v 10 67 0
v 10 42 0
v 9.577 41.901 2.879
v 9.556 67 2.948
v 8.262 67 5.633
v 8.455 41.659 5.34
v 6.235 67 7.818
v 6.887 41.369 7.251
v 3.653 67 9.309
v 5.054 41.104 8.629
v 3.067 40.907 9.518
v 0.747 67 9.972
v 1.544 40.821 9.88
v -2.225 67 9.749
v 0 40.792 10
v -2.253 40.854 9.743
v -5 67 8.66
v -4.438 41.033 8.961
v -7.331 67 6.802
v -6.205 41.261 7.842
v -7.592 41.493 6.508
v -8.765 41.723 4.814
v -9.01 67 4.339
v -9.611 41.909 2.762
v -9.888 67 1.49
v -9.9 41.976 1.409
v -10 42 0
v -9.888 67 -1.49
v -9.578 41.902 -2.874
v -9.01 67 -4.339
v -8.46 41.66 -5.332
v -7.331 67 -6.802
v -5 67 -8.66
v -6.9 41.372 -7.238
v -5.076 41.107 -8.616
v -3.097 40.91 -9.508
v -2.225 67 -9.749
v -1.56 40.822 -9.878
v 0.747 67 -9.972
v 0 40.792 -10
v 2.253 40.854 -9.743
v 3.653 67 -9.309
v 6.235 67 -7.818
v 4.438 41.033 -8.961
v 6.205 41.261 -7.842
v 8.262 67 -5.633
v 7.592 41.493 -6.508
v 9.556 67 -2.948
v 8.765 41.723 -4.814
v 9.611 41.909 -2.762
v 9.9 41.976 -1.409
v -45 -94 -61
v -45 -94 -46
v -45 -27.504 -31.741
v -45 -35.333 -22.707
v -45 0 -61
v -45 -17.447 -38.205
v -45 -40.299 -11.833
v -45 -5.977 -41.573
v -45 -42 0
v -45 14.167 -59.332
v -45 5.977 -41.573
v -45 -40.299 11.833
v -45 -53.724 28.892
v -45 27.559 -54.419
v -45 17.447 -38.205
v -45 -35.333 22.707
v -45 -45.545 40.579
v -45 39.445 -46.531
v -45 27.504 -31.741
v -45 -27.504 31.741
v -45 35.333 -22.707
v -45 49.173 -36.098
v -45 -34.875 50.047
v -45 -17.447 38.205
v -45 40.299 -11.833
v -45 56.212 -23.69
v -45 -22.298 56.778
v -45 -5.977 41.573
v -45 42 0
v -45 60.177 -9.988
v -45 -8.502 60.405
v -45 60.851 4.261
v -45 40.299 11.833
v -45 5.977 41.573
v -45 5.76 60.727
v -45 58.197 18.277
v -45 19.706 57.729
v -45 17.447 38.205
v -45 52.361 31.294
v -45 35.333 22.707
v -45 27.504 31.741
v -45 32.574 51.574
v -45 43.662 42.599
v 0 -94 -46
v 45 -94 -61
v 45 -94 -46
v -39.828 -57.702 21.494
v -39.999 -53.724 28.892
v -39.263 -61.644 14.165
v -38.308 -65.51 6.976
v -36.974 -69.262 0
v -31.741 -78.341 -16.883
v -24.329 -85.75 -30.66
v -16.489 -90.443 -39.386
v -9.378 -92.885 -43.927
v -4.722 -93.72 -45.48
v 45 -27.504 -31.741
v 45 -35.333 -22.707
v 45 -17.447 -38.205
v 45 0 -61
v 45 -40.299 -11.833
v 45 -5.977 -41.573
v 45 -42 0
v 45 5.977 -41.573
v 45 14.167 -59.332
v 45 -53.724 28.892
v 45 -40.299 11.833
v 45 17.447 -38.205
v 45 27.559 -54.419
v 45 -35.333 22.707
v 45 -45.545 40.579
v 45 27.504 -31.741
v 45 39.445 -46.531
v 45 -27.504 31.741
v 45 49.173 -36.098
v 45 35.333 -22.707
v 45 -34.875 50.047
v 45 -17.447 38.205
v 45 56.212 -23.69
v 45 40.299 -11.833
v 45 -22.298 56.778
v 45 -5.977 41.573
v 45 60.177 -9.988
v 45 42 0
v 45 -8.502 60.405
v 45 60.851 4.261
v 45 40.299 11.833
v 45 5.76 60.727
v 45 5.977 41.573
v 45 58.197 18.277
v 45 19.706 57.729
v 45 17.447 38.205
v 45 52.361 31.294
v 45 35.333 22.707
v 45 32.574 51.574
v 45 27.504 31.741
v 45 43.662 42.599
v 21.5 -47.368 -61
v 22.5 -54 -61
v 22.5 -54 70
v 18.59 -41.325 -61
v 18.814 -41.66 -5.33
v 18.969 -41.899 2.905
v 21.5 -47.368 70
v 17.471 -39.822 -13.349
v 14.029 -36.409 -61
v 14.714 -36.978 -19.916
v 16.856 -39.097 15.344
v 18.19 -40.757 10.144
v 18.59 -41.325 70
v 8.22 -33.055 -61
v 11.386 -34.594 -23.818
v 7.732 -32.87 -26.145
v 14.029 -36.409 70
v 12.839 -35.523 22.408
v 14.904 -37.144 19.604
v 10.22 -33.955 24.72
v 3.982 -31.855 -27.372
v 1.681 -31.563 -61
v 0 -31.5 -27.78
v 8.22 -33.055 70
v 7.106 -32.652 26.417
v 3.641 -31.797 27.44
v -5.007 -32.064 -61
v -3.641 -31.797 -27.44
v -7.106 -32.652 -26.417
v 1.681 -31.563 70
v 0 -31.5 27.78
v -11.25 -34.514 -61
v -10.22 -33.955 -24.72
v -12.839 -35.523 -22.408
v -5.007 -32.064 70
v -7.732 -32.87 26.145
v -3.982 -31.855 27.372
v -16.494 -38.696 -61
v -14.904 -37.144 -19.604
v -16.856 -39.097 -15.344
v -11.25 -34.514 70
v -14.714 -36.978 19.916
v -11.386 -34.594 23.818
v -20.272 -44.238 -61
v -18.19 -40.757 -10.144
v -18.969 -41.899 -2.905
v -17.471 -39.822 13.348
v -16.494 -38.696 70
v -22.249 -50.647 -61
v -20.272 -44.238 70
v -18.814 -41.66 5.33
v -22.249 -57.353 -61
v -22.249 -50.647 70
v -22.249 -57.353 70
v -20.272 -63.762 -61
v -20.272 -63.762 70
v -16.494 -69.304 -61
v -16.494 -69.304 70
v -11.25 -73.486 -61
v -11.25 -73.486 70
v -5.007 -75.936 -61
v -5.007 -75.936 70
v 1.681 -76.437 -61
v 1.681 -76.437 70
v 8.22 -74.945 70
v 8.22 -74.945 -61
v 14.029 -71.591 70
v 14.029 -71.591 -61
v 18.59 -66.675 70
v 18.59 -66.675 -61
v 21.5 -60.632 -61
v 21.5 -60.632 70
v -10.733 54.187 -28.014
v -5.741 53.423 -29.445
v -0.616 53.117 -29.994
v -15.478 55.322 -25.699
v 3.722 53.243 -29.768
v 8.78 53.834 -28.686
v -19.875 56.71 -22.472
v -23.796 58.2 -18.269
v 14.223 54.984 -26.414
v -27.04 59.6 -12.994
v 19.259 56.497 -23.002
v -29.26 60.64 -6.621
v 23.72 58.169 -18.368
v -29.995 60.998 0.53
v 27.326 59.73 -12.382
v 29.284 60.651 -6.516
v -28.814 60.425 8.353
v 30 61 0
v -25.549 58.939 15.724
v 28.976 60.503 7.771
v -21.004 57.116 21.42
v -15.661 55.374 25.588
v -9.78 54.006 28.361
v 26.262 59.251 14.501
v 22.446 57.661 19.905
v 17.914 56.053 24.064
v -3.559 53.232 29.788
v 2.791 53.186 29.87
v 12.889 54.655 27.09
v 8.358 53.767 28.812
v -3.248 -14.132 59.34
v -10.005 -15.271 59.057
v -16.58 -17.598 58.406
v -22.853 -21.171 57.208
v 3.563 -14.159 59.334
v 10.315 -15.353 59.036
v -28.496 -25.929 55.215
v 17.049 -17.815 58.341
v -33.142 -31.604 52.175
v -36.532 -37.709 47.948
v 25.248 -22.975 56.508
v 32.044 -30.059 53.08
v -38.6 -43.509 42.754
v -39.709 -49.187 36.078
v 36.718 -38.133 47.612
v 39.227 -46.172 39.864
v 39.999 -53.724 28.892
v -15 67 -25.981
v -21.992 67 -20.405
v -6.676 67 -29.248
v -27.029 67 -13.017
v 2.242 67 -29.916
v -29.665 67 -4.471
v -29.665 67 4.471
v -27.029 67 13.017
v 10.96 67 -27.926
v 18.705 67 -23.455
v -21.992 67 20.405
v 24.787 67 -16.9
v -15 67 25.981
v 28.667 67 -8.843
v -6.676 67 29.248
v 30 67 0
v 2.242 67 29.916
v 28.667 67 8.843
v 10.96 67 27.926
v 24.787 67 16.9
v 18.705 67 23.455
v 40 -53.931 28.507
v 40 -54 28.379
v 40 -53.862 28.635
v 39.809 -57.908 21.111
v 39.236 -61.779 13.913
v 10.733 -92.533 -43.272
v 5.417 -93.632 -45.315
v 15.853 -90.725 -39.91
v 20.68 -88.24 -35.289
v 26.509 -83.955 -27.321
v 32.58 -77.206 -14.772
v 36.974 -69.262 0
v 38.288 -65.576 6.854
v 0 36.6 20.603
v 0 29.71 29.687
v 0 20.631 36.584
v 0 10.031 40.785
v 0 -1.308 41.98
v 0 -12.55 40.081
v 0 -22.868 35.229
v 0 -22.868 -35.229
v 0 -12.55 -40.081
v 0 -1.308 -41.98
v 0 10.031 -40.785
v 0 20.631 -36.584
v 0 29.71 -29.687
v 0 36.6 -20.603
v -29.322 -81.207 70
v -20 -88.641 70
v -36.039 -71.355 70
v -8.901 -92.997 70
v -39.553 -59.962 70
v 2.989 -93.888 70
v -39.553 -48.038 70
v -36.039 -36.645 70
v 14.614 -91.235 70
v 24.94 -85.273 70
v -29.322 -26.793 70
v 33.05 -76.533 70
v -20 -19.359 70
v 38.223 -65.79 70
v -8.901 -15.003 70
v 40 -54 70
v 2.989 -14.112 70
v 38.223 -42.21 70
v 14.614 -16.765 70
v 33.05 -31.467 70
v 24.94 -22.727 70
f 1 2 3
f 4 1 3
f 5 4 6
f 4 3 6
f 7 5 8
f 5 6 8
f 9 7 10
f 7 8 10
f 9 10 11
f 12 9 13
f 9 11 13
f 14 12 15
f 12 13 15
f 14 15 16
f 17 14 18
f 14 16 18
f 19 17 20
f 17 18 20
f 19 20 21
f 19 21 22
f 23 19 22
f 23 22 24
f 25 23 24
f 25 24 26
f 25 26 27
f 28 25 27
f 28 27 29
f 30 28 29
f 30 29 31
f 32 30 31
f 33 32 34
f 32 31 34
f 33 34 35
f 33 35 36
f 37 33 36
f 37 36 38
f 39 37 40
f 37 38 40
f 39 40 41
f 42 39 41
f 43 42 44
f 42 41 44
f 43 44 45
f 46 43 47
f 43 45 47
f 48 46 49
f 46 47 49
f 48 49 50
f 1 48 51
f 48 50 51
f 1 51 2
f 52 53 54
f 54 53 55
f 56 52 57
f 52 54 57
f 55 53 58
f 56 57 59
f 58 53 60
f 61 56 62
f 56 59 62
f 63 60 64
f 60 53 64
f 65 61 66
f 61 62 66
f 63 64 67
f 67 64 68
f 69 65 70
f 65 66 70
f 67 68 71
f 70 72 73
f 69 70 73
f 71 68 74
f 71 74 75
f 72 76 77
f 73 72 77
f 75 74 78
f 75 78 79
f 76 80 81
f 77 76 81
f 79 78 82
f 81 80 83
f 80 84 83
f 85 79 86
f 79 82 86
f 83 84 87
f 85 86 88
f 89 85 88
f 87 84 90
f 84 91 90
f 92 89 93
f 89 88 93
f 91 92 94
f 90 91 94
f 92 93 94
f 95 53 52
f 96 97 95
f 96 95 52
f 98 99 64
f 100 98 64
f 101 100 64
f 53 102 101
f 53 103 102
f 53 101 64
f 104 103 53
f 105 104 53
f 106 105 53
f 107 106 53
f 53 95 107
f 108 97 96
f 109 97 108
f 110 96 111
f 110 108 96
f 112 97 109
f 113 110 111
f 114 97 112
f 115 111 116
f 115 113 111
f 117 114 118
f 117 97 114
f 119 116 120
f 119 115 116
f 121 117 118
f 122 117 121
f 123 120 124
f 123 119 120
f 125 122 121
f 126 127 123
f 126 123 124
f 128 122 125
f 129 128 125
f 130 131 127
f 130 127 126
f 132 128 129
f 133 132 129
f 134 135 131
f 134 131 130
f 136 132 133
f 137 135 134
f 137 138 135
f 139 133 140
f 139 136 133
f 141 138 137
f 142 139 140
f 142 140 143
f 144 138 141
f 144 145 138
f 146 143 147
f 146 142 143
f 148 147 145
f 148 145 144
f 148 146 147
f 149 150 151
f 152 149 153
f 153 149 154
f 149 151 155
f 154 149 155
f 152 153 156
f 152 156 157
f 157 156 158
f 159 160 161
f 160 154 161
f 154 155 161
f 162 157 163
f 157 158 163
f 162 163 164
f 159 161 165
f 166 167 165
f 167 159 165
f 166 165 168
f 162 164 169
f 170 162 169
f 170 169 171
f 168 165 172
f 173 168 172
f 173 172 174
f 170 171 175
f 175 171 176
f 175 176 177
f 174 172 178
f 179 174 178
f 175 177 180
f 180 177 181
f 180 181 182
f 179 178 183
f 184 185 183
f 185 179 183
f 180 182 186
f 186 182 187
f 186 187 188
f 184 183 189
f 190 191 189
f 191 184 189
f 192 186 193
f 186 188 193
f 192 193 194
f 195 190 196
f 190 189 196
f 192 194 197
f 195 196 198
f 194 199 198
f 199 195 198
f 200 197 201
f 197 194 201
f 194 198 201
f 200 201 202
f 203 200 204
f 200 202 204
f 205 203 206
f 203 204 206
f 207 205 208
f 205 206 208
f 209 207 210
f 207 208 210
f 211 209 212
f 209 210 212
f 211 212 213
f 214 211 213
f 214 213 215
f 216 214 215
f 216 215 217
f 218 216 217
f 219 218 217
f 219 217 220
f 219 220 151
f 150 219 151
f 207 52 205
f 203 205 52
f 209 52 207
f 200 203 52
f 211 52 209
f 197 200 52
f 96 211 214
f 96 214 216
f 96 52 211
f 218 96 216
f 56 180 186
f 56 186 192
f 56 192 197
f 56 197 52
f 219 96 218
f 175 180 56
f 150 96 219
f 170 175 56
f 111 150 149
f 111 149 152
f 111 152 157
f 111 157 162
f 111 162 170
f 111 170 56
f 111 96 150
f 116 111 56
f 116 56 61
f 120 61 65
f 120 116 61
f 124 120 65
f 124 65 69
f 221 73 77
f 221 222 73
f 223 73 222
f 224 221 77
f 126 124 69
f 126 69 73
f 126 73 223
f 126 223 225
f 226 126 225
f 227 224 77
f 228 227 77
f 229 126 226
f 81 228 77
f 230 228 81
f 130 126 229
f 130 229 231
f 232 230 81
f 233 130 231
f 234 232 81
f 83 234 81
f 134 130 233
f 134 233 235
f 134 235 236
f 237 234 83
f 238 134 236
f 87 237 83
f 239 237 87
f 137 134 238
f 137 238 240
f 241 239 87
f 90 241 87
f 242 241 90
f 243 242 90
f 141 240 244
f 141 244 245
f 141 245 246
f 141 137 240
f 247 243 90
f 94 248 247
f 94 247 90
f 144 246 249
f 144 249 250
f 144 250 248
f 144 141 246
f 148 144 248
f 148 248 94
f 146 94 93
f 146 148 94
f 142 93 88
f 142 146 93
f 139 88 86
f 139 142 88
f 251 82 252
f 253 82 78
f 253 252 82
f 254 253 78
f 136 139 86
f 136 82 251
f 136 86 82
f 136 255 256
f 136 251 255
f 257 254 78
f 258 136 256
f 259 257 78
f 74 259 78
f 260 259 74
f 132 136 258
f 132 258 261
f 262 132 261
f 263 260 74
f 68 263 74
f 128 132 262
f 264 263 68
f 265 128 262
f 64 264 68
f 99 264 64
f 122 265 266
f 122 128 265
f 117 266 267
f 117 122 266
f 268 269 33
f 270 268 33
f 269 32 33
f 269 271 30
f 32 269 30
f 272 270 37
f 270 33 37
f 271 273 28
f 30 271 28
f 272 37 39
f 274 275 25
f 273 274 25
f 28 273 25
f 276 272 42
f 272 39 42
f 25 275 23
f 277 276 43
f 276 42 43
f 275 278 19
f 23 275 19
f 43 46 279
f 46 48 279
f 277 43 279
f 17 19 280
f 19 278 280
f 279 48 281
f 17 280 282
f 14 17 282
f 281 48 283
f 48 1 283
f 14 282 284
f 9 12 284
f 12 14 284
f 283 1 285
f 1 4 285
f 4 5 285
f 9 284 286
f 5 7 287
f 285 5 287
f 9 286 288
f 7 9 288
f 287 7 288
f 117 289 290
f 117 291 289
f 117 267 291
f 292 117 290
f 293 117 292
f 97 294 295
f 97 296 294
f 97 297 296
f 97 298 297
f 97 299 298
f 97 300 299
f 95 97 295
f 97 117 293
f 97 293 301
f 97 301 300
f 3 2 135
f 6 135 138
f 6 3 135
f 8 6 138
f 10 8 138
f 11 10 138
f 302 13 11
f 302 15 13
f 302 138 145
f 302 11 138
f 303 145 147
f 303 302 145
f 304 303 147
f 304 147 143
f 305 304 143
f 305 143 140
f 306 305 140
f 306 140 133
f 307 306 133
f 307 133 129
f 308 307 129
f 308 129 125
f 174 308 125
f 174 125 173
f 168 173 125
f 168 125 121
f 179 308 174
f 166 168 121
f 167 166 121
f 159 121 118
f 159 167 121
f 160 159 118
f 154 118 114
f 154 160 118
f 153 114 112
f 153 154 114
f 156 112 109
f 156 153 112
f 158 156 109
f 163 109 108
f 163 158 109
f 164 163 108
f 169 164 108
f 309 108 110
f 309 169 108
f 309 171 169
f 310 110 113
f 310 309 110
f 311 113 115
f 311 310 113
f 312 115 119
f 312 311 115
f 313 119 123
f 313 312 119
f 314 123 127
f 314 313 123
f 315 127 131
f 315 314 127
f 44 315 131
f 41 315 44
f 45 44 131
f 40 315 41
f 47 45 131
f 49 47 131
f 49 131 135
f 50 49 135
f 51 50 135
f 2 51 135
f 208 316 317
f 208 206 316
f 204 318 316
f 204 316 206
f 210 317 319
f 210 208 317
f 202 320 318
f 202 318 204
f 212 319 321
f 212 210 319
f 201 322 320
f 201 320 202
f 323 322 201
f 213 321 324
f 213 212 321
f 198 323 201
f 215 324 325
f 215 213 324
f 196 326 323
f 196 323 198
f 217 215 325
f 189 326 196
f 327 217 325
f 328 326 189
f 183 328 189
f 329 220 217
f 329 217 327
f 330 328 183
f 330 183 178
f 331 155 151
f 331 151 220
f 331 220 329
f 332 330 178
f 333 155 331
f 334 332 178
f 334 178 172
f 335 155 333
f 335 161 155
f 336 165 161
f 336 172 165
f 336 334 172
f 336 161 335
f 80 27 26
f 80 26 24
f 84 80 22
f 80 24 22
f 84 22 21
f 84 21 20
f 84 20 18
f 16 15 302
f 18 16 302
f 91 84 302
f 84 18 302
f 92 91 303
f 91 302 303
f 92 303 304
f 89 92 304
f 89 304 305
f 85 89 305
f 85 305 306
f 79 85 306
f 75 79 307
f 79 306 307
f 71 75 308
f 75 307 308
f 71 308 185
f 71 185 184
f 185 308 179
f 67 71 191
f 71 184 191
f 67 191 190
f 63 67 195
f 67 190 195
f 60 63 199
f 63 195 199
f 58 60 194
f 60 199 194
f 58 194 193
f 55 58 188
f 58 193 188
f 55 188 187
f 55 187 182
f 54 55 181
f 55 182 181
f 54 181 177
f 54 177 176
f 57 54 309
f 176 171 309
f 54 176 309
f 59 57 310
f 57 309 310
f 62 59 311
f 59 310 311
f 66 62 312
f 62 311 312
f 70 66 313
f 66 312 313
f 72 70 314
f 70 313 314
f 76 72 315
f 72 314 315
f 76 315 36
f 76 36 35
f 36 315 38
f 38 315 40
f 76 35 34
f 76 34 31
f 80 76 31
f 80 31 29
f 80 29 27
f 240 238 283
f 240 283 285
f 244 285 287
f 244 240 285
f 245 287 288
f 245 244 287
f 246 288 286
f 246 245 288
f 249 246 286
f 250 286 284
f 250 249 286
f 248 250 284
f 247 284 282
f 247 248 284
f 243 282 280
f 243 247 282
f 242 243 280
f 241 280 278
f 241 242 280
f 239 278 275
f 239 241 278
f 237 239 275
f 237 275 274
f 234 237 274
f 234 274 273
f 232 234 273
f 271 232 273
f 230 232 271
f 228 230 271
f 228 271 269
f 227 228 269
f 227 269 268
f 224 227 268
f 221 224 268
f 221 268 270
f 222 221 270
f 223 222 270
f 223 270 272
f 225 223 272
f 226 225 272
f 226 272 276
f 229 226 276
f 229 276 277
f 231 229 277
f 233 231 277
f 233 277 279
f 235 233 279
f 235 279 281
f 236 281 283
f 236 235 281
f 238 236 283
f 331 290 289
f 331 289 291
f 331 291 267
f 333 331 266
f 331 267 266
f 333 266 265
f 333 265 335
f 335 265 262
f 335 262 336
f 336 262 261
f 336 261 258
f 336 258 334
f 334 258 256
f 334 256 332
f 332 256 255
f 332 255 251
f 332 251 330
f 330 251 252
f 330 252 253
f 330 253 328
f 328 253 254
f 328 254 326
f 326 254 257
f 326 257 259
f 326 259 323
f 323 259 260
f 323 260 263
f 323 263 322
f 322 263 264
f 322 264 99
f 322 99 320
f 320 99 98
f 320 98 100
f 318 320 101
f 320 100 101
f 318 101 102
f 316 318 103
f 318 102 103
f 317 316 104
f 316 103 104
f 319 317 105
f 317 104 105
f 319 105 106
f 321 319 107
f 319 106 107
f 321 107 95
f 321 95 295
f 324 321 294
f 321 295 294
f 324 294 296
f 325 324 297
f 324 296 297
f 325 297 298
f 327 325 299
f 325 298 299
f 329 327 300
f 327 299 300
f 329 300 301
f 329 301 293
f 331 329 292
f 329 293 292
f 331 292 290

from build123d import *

# Parameters (mm, degrees)
F1_DEPTH       = 45
F2_R           = 40
F3_DEPTH       = 70
F3_DEPTH_BACK  = 61
F4_R           = 30
F5_DEPTH       = 67
F6_R           = 22.5
F9_DEPTH       = 131.0010001
F7_R           = 42
F10_DEPTH      = 45
F10_DEPTH_BACK = 45
F8_R           = 10
F11_DEPTH      = 67.0010001


with BuildPart() as f1:
    # F0 (on Right) → F1 (new body, symmetric)
    with BuildSketch(Plane.YZ):
        with BuildLine():
            Line((-53.7237960867, 28.8921050468), (-94, -46))
            Line((-94, -46), (-94, -61))
            Line((-94, -61), (0, -61))
            ThreePointArc((0, -61), (52.3613330992, 31.2936222907), (-53.7237960867, 28.8921050468))
        make_face()
    extrude(amount=F1_DEPTH, both=True)

    # F2 (on Top) → F3 (join, two sides)
    with BuildSketch(Plane.XY) as f3_sk:
        with Locations((0, -54)):
            Circle(F2_R)
    extrude(amount=F3_DEPTH)
    extrude(f3_sk.sketch, amount=-F3_DEPTH_BACK)

    # F4 (on Front) → F5 (join)
    with BuildSketch(Plane.XZ):
        Circle(F4_R)
    extrude(amount=-F5_DEPTH)

    # F6 (on face) → F9 (cut, through all)
    with BuildSketch(Plane.XY.offset(70)):
        with Locations((0, -54)):
            Circle(F6_R)
    extrude(amount=-F9_DEPTH, mode=Mode.SUBTRACT)

    # F7 (on Right) → F10 (cut, two sides)
    with BuildSketch(Plane.YZ) as f10_sk:
        Circle(F7_R)
    extrude(amount=-F10_DEPTH, mode=Mode.SUBTRACT)
    extrude(f10_sk.sketch, amount=F10_DEPTH_BACK, mode=Mode.SUBTRACT)

    # F8 (on Front) → F11 (cut, through all)
    with BuildSketch(Plane.XZ):
        Circle(F8_R)
    extrude(amount=-F11_DEPTH, mode=Mode.SUBTRACT)


solid = f1.part
